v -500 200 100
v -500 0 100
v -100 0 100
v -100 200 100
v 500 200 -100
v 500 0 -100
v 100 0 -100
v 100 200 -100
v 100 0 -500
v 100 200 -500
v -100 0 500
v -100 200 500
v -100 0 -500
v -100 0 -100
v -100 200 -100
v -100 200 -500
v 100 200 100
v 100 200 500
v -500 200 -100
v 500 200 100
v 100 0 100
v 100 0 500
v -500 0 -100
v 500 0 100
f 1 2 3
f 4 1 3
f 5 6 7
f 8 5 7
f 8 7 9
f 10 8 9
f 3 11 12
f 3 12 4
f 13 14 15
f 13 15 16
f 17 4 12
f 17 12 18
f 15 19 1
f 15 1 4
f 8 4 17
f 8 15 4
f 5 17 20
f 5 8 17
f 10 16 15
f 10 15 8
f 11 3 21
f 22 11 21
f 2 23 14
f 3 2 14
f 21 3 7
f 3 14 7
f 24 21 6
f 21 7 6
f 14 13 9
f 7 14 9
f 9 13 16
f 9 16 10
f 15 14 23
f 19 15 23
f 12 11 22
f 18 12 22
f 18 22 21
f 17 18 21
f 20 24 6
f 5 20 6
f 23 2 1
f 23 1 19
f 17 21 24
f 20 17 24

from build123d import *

# Parameters (mm, degrees)
SKETCH_1_W      = 400
SKETCH_1_H      = 200
SKETCH_1_W_2    = 200
SKETCH_1_H_2    = 400
EXTRUDE_1_DEPTH = 200


with BuildPart() as part:
    # 草圖1 → 填料-伸長1 (new body)
    with BuildSketch(Plane(origin=(0, 0, 0), x_dir=(1, 0, 0), z_dir=(0, 1, 0))):
        with Locations((-300, 0)):
            Rectangle(SKETCH_1_W, SKETCH_1_H)
        Rectangle(SKETCH_1_W_2, SKETCH_1_H)
        with Locations((300, 0)):
            Rectangle(SKETCH_1_W, SKETCH_1_H)
        with Locations((0, -300)):
            Rectangle(SKETCH_1_W_2, SKETCH_1_H_2)
        with Locations((0, 300)):
            Rectangle(SKETCH_1_W_2, SKETCH_1_H_2)
    extrude(amount=EXTRUDE_1_DEPTH)


solid = part.part
